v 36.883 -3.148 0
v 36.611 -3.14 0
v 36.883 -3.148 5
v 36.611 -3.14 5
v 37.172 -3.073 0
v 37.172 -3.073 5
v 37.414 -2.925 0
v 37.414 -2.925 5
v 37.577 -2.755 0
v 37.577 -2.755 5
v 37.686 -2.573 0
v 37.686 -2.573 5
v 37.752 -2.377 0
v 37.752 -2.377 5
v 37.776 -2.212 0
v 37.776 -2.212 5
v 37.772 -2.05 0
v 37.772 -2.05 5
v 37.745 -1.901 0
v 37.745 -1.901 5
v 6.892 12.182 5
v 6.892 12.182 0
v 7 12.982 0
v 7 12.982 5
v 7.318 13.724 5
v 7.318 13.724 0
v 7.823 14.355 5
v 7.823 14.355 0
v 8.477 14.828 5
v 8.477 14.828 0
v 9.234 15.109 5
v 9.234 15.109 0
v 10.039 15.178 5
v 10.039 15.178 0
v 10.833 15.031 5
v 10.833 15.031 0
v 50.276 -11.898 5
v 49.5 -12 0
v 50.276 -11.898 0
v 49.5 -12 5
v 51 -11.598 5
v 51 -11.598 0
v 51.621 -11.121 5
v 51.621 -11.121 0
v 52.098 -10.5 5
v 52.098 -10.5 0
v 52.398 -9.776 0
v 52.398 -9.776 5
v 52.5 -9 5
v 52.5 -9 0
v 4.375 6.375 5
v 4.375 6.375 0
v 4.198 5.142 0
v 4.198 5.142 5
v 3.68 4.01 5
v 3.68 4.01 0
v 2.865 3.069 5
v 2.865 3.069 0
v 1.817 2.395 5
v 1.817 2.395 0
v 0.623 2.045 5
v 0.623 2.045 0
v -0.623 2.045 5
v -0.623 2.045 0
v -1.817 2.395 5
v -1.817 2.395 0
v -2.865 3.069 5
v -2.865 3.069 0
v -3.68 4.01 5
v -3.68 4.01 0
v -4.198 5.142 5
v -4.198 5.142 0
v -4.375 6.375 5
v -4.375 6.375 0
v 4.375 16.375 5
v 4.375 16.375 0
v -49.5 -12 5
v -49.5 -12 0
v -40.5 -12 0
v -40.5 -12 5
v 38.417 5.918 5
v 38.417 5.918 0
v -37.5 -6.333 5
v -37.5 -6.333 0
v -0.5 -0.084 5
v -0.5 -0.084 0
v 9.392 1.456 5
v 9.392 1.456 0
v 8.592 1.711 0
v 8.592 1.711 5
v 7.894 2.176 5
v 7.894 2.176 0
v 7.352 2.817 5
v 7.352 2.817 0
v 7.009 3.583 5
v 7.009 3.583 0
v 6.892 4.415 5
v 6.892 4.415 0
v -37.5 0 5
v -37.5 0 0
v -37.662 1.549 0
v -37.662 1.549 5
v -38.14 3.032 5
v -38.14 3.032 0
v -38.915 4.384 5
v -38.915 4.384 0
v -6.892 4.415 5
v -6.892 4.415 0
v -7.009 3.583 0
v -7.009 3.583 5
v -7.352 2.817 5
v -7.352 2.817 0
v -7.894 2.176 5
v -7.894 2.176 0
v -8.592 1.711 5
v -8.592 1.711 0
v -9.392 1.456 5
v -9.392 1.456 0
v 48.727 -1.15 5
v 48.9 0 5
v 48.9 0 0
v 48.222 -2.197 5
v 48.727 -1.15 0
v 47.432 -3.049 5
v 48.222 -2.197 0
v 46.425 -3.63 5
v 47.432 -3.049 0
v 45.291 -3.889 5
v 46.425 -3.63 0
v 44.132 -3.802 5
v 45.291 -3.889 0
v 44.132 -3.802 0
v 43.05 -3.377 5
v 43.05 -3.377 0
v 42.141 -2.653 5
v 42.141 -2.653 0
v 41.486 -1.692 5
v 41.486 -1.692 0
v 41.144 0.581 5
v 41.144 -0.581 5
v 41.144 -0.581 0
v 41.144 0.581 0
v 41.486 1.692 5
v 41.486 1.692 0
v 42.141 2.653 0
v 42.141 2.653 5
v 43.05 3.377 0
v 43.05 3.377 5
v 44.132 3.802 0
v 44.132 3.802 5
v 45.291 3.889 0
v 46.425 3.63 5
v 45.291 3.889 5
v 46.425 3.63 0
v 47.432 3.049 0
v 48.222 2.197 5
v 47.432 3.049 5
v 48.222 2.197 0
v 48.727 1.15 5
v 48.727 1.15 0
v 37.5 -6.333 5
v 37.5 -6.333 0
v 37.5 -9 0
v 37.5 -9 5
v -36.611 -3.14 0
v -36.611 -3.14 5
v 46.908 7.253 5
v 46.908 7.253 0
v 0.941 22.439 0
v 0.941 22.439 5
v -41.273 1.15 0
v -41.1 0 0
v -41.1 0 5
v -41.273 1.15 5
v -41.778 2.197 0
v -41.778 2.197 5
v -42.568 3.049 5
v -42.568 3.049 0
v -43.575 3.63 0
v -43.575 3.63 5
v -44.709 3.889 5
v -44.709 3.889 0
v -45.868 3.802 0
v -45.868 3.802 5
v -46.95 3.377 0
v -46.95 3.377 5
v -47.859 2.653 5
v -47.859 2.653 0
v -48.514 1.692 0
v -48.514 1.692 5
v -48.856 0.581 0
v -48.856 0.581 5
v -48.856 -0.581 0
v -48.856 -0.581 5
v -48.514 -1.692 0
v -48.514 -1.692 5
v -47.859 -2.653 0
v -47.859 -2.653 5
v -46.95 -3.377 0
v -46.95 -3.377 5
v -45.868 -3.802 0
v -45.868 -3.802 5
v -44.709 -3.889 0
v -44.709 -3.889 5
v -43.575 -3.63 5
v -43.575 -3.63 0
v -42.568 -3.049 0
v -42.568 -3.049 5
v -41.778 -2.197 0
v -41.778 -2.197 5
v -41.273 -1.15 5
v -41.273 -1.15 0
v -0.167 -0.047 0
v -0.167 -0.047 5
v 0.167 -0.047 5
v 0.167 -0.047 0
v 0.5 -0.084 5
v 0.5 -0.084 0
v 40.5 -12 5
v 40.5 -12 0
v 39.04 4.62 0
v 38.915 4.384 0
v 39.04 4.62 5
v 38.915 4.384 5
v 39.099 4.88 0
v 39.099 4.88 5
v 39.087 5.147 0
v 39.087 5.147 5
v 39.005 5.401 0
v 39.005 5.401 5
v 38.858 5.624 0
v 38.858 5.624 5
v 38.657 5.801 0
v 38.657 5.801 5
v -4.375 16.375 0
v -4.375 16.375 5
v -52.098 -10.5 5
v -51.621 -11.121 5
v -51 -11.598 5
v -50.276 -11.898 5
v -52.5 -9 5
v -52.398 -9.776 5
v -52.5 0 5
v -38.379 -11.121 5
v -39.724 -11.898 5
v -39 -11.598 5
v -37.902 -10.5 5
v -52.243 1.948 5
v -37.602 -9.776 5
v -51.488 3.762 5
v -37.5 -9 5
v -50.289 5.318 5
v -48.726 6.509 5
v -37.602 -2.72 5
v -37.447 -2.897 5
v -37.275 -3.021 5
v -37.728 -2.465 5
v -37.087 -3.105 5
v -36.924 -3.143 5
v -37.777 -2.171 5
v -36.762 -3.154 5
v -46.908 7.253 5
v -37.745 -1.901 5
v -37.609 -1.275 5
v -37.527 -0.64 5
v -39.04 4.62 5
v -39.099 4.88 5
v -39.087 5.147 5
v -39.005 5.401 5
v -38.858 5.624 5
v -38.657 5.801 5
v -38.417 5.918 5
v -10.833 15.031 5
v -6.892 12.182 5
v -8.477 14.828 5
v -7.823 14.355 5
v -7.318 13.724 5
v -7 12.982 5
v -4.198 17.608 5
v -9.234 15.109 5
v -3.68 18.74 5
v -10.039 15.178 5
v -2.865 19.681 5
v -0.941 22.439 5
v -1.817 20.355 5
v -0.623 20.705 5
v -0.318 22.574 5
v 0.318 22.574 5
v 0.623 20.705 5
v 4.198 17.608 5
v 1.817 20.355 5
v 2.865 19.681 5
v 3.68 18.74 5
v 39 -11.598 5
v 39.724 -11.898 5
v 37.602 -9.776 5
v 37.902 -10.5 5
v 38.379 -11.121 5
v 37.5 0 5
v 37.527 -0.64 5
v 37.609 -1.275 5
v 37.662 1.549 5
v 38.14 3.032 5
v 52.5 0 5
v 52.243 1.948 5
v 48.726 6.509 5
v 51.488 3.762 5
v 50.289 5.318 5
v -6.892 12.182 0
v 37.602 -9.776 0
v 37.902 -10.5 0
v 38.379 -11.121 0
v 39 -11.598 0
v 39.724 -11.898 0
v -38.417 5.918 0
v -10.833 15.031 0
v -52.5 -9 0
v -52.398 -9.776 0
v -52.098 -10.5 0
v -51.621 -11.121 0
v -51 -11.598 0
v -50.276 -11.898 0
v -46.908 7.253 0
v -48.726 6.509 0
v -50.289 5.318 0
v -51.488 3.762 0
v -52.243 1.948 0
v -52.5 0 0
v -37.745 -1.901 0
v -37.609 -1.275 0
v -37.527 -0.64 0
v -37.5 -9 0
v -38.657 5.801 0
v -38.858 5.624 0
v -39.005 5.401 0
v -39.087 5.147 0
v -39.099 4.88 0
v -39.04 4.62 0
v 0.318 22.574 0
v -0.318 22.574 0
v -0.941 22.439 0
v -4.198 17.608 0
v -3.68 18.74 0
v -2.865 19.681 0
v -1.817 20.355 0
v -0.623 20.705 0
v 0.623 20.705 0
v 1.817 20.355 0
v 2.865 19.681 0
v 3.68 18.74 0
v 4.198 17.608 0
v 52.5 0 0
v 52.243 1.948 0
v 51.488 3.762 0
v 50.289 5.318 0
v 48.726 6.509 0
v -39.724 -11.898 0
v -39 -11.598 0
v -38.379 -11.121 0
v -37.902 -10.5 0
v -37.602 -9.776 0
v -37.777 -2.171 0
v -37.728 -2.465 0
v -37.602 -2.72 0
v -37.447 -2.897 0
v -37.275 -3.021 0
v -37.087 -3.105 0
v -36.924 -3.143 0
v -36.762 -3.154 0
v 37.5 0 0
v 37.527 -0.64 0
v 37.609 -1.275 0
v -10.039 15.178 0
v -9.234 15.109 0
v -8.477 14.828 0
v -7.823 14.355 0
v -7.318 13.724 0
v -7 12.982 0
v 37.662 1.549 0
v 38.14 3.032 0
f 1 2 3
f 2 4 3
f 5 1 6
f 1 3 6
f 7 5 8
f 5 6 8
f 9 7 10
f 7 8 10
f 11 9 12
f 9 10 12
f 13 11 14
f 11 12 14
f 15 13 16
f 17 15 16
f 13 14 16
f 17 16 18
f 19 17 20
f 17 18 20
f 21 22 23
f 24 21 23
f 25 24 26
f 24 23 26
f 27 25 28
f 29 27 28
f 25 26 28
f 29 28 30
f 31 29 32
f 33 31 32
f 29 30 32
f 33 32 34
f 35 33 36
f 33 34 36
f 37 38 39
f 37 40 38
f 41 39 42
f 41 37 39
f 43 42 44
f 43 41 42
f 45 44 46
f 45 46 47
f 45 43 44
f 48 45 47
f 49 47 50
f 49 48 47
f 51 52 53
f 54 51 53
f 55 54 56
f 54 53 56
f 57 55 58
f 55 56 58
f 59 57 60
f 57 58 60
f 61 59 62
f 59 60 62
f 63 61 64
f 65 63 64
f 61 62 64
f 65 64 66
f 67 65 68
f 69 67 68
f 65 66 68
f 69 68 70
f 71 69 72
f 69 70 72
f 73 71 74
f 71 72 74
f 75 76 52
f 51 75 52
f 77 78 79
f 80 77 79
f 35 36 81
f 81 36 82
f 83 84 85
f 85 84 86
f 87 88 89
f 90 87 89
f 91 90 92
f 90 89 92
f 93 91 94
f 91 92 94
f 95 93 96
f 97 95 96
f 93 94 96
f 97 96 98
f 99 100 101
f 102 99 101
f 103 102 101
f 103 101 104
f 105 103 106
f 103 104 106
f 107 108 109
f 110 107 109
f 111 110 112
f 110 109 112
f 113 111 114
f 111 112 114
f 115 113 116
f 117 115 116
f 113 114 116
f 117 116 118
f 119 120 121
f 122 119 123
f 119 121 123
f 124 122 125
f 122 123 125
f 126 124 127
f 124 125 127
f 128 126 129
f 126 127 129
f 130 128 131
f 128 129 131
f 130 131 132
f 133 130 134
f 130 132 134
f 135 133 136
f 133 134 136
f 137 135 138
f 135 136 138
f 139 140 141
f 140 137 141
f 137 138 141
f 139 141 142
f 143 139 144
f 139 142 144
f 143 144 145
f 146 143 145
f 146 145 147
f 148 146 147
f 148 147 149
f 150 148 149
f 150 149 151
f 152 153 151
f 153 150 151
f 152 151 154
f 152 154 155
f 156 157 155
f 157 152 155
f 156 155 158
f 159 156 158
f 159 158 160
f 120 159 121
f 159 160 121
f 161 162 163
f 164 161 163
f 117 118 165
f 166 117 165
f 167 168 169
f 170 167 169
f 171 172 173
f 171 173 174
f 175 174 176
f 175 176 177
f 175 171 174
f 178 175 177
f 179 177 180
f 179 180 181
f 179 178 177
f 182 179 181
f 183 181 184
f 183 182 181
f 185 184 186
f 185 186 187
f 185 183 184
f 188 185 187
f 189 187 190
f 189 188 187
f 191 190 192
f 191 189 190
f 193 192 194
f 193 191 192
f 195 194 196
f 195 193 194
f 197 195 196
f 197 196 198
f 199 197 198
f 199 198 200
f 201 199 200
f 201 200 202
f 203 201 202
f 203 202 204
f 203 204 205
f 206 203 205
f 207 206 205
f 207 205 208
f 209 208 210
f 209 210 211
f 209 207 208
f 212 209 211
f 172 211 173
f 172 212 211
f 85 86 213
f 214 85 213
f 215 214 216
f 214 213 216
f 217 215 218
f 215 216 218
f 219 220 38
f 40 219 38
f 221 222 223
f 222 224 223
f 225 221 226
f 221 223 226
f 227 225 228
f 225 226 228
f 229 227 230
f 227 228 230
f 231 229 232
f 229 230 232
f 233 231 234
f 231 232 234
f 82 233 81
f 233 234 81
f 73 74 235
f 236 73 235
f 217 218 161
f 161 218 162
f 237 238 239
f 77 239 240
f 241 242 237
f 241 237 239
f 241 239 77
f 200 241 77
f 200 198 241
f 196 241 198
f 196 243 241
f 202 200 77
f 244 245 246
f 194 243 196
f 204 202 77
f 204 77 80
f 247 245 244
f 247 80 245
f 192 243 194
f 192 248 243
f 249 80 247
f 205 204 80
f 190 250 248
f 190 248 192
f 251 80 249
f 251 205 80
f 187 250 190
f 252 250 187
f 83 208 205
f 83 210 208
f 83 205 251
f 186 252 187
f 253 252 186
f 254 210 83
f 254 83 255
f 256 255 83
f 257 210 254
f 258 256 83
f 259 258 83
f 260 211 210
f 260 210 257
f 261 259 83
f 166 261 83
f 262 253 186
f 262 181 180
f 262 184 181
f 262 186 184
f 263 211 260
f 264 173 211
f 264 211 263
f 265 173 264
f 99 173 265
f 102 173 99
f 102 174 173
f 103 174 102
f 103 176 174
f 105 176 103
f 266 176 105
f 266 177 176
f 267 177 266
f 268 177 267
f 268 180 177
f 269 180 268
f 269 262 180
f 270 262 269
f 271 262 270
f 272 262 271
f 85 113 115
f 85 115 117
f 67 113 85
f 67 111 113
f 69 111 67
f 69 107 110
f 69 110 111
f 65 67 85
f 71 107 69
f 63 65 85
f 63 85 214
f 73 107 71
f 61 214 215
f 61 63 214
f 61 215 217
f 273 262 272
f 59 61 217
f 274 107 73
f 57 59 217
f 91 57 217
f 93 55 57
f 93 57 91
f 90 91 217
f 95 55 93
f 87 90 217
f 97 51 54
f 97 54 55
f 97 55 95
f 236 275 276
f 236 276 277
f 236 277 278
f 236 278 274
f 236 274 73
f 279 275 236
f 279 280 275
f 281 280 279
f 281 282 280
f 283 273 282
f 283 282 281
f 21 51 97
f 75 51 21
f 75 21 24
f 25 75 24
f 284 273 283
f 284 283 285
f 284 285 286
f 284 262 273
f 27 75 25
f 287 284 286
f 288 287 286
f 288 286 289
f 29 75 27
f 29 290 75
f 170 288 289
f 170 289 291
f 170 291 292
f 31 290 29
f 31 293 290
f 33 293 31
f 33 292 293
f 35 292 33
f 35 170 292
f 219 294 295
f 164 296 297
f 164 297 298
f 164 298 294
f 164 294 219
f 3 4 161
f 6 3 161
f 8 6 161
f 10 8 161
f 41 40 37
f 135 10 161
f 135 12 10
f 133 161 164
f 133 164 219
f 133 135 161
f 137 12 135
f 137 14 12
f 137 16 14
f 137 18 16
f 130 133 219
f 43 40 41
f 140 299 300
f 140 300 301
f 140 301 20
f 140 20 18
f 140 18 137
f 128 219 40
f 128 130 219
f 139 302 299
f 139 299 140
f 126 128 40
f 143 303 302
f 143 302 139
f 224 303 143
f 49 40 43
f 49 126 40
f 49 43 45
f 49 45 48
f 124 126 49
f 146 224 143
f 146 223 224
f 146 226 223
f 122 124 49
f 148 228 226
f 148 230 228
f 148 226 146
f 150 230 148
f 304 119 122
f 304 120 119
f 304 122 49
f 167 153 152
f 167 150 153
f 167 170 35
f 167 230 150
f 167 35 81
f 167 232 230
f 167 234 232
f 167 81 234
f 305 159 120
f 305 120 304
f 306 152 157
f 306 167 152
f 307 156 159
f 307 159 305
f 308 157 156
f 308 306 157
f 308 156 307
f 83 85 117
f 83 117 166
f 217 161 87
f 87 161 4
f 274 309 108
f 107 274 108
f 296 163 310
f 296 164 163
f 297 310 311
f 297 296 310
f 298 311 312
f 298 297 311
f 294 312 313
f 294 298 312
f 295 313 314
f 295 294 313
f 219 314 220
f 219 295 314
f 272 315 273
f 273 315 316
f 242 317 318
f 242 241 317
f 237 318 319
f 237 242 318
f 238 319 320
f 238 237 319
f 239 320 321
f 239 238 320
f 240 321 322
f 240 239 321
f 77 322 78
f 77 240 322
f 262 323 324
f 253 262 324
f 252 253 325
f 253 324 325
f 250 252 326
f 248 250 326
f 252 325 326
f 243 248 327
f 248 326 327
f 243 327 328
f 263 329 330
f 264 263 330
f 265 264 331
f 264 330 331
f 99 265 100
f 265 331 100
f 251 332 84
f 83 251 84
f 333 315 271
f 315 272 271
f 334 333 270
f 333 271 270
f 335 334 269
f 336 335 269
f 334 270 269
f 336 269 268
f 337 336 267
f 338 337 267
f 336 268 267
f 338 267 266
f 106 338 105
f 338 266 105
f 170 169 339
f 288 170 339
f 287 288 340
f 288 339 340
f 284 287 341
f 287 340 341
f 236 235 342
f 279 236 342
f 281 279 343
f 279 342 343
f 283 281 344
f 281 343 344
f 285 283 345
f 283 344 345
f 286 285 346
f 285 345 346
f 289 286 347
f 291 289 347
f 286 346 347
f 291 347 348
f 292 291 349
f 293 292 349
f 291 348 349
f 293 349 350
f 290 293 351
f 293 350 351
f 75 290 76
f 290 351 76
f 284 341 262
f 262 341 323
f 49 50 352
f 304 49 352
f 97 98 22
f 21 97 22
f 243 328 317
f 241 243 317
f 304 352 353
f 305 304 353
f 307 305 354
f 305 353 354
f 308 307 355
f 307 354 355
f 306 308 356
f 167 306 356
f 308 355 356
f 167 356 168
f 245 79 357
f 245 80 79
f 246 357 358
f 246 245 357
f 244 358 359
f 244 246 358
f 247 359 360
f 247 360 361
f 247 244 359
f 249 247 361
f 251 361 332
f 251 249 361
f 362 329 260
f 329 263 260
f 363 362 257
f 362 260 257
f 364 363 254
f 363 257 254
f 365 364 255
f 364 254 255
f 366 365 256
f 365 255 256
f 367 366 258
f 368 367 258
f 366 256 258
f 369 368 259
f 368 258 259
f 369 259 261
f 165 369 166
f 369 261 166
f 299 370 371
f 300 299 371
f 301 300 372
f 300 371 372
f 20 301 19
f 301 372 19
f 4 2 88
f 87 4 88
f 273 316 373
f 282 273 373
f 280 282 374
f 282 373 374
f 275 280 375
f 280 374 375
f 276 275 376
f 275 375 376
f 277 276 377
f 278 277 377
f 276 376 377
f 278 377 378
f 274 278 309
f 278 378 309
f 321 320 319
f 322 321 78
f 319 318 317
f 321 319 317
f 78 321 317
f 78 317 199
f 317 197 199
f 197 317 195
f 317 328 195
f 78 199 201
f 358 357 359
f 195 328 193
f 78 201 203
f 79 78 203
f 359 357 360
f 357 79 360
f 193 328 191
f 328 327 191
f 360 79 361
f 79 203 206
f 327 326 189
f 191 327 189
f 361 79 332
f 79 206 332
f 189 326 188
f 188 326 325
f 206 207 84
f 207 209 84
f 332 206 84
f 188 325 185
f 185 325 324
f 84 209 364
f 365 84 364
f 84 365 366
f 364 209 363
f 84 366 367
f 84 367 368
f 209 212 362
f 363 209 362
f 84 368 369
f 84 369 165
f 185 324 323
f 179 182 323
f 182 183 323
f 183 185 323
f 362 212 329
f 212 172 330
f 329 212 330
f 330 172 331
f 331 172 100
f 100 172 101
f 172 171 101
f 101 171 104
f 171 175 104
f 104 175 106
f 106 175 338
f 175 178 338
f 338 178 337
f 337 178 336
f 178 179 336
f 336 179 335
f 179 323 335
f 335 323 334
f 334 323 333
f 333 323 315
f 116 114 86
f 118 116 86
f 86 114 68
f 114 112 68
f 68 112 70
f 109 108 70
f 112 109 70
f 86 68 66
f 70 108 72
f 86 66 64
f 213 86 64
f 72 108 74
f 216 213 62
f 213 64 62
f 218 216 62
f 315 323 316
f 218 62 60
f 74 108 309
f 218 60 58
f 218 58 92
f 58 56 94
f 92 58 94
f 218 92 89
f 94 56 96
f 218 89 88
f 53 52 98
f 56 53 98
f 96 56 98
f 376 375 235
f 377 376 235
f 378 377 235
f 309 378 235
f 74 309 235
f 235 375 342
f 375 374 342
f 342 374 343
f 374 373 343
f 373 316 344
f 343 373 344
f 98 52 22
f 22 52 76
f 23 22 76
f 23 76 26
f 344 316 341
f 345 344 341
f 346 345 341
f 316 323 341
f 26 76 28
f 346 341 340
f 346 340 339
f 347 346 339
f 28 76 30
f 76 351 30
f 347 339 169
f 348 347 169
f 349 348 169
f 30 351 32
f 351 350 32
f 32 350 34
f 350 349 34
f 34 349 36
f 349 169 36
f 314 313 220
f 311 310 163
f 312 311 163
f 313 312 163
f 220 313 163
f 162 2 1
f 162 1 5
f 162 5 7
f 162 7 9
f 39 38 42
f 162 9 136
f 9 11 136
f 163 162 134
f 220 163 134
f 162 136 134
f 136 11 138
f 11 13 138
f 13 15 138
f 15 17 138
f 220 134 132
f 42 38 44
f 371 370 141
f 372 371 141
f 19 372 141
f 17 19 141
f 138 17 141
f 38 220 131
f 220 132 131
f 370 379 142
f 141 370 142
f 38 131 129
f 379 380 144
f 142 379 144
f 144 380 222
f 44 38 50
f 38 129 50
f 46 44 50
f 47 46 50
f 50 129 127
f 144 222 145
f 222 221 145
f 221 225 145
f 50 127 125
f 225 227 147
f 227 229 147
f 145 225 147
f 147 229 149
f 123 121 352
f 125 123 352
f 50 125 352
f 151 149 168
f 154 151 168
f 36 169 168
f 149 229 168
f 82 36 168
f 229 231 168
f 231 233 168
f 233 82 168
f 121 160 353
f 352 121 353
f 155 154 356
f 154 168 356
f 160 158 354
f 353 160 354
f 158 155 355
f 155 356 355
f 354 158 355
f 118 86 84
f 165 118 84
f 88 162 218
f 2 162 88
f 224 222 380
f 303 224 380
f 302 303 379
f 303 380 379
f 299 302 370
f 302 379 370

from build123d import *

# Parameters (mm, degrees)
F0_R     = 3.9
F1_DEPTH = 5
F2_DEPTH = 25
F3_R     = 1
F4_R     = 3


with BuildPart() as f1:
    # F0 (on Top) → F1 (new body)
    with BuildSketch(Plane.XY):
        with BuildLine():
            ThreePointArc((-46.9082644116, 7.2531735768), (-43.1416684259, 7.2661271501), (-39.8437820891, 5.4464132101))
            Line((-39.8437820891, 5.4464132101), (-10.8327285679, 15.0306360845))
            ThreePointArc((-10.8327285679, 15.0306360845), (-8.1342763091, 14.6134381435), (-6.8916598566, 12.1820593029))
            Line((-6.8916598566, 12.1820593029), (-6.8916598566, 4.4145286559))
            ThreePointArc((-6.8916598566, 4.4145286559), (-7.6005216796, 2.4778599043), (-9.3921170923, 1.4564115138))
            Line((-9.3921170923, 1.4564115138), (-37.5, -3.2902191476))
            Line((-37.5, -3.2902191476), (-37.5, -6.332695009))
            Line((-37.5, -6.332695009), (-0.4995427643, -0.0843587192))
            ThreePointArc((-0.4995427643, -0.0843587192), (0, -0.0424758613), (0.4995427643, -0.0843587192))
            Line((0.4995427643, -0.0843587192), (37.5, -6.332695009))
            Line((37.5, -6.332695009), (37.5, -3.2902191476))
            Line((37.5, -3.2902191476), (9.3921170923, 1.4564115138))
            ThreePointArc((9.3921170923, 1.4564115138), (7.6005216796, 2.4778599043), (6.8916598566, 4.4145286559))
            Line((6.8916598566, 4.4145286559), (6.8916598566, 12.1820593029))
            ThreePointArc((6.8916598566, 12.1820593029), (8.1342763091, 14.6134381435), (10.8327285679, 15.0306360845))
            Line((10.8327285679, 15.0306360845), (39.8437820891, 5.4464132101))
            ThreePointArc((39.8437820891, 5.4464132101), (43.1416684259, 7.2661271501), (46.9082644116, 7.2531735768))
            Line((46.9082644116, 7.2531735768), (0.9410687113, 22.4391042836))
            ThreePointArc((0.9410687113, 22.4391042836), (0, 22.590527502), (-0.9410687113, 22.4391042836))
            Line((-0.9410687113, 22.4391042836), (-46.9082644116, 7.2531735768))
        make_face()
        with BuildLine():
            ThreePointArc((-4.375, 16.375), (0, 20.75), (4.375, 16.375))
            Line((4.375, 16.375), (4.375, 6.375))
            ThreePointArc((4.375, 6.375), (0, 2), (-4.375, 6.375))
            Line((-4.375, 6.375), (-4.375, 16.375))
        make_face(mode=Mode.SUBTRACT)
        with BuildLine():
            Line((-37.5, -3.2902191476), (-38.3305275597, -3.4304718872))
            ThreePointArc((-38.3305275597, -3.4304718872), (-40.4438234256, -5.9574537365), (-43.4360893176, -7.3351334942))
            Line((-43.4360893176, -7.3351334942), (-37.5, -6.332695009))
            Line((-37.5, -6.332695009), (-37.5, -3.2902191476))
        make_face()
        with BuildLine():
            ThreePointArc((-38.3305275597, -3.4304718872), (-37.7105883879, -1.7647884715), (-37.5, 0))
            ThreePointArc((-37.5, 0), (-38.110818832, 2.9646556012), (-39.8437820891, 5.4464132101))
            ThreePointArc((-39.8437820891, 5.4464132101), (-43.1416684259, 7.2661271501), (-46.9082644116, 7.2531735768))
            ThreePointArc((-46.9082644116, 7.2531735768), (-50.9397804289, 4.5791929919), (-52.5, 0))
            ThreePointArc((-52.5, 0), (-49.7180859404, -5.8300656136), (-43.4360893176, -7.3351334942))
            ThreePointArc((-43.4360893176, -7.3351334942), (-40.4438234256, -5.9574537365), (-38.3305275597, -3.4304718872))
        make_face()
        with Locations((-45, 0)):
            Circle(F0_R, mode=Mode.SUBTRACT)
        with BuildLine():
            ThreePointArc((52.5, 0), (50.9397804289, 4.5791929919), (46.9082644116, 7.2531735768))
            ThreePointArc((46.9082644116, 7.2531735768), (43.1416684259, 7.2661271501), (39.8437820891, 5.4464132101))
            ThreePointArc((39.8437820891, 5.4464132101), (38.110818832, 2.9646556012), (37.5, 0))
            Line((37.5, 0), (41.1, 0))
            ThreePointArc((41.1, 0), (45, 3.9), (48.9, 0))
            Line((48.9, 0), (52.5, 0))
        make_face()
        with BuildLine():
            ThreePointArc((43.4360893176, -7.3351334942), (49.7180859404, -5.8300656136), (52.5, 0))
            Line((52.5, 0), (48.9, 0))
            ThreePointArc((48.9, 0), (45, -3.9), (41.1, 0))
            Line((41.1, 0), (37.5, 0))
            ThreePointArc((37.5, 0), (37.7105883879, -1.7647884715), (38.3305275597, -3.4304718872))
            ThreePointArc((38.3305275597, -3.4304718872), (40.4438234256, -5.9574537365), (43.4360893176, -7.3351334942))
        make_face()
        with BuildLine():
            Line((37.5, -3.2902191476), (37.5, -6.332695009))
            Line((37.5, -6.332695009), (43.4360893176, -7.3351334942))
            ThreePointArc((43.4360893176, -7.3351334942), (40.4438234256, -5.9574537365), (38.3305275597, -3.4304718872))
            Line((38.3305275597, -3.4304718872), (37.5, -3.2902191476))
        make_face()
        with BuildLine():
            Line((43.4360893176, -7.3351334942), (37.5, -6.332695009))
            Line((37.5, -6.332695009), (37.5, -12))
            Line((37.5, -12), (52.5, -12))
            Line((52.5, -12), (52.5, 0))
            ThreePointArc((52.5, 0), (49.7180859404, -5.8300656136), (43.4360893176, -7.3351334942))
        make_face()
        with BuildLine():
            Line((-37.5, -6.332695009), (-43.4360893176, -7.3351334942))
            ThreePointArc((-43.4360893176, -7.3351334942), (-49.7180859404, -5.8300656136), (-52.5, 0))
            Line((-52.5, 0), (-52.5, -12))
            Line((-52.5, -12), (-37.5, -12))
            Line((-37.5, -12), (-37.5, -6.332695009))
        make_face()
    extrude(amount=F1_DEPTH)

    # F0 (on Top) → F2 (cut)
    with BuildSketch(Plane.XY):
        with Locations((-45, 0)):
            Circle(F0_R)
        with BuildLine():
            Line((41.1, 0), (48.9, 0))
            ThreePointArc((48.9, 0), (45, 3.9), (41.1, 0))
        make_face()
        with BuildLine():
            ThreePointArc((41.1, 0), (45, -3.9), (48.9, 0))
            Line((48.9, 0), (41.1, 0))
        make_face()
    extrude(amount=F2_DEPTH, mode=Mode.SUBTRACT)

    # F3
    f3_edges = [f1.edges().sort_by_distance(p)[0] for p in [
        (-39.843782, 5.446413, 2.5),
        (-38.330528, -3.430472, 2.5),
        (39.843782, 5.446413, 2.5),
        (38.330528, -3.430472, 2.5),
    ]]
    fillet(f3_edges, radius=F3_R)

    # F4
    f4_edges = [f1.edges().sort_by_distance(p)[0] for p in [
        (-52.5, -12, 2.5),
        (-37.5, -12, 2.5),
        (37.5, -12, 2.5),
        (52.5, -12, 2.5),
    ]]
    fillet(f4_edges, radius=F4_R)


solid = f1.part
